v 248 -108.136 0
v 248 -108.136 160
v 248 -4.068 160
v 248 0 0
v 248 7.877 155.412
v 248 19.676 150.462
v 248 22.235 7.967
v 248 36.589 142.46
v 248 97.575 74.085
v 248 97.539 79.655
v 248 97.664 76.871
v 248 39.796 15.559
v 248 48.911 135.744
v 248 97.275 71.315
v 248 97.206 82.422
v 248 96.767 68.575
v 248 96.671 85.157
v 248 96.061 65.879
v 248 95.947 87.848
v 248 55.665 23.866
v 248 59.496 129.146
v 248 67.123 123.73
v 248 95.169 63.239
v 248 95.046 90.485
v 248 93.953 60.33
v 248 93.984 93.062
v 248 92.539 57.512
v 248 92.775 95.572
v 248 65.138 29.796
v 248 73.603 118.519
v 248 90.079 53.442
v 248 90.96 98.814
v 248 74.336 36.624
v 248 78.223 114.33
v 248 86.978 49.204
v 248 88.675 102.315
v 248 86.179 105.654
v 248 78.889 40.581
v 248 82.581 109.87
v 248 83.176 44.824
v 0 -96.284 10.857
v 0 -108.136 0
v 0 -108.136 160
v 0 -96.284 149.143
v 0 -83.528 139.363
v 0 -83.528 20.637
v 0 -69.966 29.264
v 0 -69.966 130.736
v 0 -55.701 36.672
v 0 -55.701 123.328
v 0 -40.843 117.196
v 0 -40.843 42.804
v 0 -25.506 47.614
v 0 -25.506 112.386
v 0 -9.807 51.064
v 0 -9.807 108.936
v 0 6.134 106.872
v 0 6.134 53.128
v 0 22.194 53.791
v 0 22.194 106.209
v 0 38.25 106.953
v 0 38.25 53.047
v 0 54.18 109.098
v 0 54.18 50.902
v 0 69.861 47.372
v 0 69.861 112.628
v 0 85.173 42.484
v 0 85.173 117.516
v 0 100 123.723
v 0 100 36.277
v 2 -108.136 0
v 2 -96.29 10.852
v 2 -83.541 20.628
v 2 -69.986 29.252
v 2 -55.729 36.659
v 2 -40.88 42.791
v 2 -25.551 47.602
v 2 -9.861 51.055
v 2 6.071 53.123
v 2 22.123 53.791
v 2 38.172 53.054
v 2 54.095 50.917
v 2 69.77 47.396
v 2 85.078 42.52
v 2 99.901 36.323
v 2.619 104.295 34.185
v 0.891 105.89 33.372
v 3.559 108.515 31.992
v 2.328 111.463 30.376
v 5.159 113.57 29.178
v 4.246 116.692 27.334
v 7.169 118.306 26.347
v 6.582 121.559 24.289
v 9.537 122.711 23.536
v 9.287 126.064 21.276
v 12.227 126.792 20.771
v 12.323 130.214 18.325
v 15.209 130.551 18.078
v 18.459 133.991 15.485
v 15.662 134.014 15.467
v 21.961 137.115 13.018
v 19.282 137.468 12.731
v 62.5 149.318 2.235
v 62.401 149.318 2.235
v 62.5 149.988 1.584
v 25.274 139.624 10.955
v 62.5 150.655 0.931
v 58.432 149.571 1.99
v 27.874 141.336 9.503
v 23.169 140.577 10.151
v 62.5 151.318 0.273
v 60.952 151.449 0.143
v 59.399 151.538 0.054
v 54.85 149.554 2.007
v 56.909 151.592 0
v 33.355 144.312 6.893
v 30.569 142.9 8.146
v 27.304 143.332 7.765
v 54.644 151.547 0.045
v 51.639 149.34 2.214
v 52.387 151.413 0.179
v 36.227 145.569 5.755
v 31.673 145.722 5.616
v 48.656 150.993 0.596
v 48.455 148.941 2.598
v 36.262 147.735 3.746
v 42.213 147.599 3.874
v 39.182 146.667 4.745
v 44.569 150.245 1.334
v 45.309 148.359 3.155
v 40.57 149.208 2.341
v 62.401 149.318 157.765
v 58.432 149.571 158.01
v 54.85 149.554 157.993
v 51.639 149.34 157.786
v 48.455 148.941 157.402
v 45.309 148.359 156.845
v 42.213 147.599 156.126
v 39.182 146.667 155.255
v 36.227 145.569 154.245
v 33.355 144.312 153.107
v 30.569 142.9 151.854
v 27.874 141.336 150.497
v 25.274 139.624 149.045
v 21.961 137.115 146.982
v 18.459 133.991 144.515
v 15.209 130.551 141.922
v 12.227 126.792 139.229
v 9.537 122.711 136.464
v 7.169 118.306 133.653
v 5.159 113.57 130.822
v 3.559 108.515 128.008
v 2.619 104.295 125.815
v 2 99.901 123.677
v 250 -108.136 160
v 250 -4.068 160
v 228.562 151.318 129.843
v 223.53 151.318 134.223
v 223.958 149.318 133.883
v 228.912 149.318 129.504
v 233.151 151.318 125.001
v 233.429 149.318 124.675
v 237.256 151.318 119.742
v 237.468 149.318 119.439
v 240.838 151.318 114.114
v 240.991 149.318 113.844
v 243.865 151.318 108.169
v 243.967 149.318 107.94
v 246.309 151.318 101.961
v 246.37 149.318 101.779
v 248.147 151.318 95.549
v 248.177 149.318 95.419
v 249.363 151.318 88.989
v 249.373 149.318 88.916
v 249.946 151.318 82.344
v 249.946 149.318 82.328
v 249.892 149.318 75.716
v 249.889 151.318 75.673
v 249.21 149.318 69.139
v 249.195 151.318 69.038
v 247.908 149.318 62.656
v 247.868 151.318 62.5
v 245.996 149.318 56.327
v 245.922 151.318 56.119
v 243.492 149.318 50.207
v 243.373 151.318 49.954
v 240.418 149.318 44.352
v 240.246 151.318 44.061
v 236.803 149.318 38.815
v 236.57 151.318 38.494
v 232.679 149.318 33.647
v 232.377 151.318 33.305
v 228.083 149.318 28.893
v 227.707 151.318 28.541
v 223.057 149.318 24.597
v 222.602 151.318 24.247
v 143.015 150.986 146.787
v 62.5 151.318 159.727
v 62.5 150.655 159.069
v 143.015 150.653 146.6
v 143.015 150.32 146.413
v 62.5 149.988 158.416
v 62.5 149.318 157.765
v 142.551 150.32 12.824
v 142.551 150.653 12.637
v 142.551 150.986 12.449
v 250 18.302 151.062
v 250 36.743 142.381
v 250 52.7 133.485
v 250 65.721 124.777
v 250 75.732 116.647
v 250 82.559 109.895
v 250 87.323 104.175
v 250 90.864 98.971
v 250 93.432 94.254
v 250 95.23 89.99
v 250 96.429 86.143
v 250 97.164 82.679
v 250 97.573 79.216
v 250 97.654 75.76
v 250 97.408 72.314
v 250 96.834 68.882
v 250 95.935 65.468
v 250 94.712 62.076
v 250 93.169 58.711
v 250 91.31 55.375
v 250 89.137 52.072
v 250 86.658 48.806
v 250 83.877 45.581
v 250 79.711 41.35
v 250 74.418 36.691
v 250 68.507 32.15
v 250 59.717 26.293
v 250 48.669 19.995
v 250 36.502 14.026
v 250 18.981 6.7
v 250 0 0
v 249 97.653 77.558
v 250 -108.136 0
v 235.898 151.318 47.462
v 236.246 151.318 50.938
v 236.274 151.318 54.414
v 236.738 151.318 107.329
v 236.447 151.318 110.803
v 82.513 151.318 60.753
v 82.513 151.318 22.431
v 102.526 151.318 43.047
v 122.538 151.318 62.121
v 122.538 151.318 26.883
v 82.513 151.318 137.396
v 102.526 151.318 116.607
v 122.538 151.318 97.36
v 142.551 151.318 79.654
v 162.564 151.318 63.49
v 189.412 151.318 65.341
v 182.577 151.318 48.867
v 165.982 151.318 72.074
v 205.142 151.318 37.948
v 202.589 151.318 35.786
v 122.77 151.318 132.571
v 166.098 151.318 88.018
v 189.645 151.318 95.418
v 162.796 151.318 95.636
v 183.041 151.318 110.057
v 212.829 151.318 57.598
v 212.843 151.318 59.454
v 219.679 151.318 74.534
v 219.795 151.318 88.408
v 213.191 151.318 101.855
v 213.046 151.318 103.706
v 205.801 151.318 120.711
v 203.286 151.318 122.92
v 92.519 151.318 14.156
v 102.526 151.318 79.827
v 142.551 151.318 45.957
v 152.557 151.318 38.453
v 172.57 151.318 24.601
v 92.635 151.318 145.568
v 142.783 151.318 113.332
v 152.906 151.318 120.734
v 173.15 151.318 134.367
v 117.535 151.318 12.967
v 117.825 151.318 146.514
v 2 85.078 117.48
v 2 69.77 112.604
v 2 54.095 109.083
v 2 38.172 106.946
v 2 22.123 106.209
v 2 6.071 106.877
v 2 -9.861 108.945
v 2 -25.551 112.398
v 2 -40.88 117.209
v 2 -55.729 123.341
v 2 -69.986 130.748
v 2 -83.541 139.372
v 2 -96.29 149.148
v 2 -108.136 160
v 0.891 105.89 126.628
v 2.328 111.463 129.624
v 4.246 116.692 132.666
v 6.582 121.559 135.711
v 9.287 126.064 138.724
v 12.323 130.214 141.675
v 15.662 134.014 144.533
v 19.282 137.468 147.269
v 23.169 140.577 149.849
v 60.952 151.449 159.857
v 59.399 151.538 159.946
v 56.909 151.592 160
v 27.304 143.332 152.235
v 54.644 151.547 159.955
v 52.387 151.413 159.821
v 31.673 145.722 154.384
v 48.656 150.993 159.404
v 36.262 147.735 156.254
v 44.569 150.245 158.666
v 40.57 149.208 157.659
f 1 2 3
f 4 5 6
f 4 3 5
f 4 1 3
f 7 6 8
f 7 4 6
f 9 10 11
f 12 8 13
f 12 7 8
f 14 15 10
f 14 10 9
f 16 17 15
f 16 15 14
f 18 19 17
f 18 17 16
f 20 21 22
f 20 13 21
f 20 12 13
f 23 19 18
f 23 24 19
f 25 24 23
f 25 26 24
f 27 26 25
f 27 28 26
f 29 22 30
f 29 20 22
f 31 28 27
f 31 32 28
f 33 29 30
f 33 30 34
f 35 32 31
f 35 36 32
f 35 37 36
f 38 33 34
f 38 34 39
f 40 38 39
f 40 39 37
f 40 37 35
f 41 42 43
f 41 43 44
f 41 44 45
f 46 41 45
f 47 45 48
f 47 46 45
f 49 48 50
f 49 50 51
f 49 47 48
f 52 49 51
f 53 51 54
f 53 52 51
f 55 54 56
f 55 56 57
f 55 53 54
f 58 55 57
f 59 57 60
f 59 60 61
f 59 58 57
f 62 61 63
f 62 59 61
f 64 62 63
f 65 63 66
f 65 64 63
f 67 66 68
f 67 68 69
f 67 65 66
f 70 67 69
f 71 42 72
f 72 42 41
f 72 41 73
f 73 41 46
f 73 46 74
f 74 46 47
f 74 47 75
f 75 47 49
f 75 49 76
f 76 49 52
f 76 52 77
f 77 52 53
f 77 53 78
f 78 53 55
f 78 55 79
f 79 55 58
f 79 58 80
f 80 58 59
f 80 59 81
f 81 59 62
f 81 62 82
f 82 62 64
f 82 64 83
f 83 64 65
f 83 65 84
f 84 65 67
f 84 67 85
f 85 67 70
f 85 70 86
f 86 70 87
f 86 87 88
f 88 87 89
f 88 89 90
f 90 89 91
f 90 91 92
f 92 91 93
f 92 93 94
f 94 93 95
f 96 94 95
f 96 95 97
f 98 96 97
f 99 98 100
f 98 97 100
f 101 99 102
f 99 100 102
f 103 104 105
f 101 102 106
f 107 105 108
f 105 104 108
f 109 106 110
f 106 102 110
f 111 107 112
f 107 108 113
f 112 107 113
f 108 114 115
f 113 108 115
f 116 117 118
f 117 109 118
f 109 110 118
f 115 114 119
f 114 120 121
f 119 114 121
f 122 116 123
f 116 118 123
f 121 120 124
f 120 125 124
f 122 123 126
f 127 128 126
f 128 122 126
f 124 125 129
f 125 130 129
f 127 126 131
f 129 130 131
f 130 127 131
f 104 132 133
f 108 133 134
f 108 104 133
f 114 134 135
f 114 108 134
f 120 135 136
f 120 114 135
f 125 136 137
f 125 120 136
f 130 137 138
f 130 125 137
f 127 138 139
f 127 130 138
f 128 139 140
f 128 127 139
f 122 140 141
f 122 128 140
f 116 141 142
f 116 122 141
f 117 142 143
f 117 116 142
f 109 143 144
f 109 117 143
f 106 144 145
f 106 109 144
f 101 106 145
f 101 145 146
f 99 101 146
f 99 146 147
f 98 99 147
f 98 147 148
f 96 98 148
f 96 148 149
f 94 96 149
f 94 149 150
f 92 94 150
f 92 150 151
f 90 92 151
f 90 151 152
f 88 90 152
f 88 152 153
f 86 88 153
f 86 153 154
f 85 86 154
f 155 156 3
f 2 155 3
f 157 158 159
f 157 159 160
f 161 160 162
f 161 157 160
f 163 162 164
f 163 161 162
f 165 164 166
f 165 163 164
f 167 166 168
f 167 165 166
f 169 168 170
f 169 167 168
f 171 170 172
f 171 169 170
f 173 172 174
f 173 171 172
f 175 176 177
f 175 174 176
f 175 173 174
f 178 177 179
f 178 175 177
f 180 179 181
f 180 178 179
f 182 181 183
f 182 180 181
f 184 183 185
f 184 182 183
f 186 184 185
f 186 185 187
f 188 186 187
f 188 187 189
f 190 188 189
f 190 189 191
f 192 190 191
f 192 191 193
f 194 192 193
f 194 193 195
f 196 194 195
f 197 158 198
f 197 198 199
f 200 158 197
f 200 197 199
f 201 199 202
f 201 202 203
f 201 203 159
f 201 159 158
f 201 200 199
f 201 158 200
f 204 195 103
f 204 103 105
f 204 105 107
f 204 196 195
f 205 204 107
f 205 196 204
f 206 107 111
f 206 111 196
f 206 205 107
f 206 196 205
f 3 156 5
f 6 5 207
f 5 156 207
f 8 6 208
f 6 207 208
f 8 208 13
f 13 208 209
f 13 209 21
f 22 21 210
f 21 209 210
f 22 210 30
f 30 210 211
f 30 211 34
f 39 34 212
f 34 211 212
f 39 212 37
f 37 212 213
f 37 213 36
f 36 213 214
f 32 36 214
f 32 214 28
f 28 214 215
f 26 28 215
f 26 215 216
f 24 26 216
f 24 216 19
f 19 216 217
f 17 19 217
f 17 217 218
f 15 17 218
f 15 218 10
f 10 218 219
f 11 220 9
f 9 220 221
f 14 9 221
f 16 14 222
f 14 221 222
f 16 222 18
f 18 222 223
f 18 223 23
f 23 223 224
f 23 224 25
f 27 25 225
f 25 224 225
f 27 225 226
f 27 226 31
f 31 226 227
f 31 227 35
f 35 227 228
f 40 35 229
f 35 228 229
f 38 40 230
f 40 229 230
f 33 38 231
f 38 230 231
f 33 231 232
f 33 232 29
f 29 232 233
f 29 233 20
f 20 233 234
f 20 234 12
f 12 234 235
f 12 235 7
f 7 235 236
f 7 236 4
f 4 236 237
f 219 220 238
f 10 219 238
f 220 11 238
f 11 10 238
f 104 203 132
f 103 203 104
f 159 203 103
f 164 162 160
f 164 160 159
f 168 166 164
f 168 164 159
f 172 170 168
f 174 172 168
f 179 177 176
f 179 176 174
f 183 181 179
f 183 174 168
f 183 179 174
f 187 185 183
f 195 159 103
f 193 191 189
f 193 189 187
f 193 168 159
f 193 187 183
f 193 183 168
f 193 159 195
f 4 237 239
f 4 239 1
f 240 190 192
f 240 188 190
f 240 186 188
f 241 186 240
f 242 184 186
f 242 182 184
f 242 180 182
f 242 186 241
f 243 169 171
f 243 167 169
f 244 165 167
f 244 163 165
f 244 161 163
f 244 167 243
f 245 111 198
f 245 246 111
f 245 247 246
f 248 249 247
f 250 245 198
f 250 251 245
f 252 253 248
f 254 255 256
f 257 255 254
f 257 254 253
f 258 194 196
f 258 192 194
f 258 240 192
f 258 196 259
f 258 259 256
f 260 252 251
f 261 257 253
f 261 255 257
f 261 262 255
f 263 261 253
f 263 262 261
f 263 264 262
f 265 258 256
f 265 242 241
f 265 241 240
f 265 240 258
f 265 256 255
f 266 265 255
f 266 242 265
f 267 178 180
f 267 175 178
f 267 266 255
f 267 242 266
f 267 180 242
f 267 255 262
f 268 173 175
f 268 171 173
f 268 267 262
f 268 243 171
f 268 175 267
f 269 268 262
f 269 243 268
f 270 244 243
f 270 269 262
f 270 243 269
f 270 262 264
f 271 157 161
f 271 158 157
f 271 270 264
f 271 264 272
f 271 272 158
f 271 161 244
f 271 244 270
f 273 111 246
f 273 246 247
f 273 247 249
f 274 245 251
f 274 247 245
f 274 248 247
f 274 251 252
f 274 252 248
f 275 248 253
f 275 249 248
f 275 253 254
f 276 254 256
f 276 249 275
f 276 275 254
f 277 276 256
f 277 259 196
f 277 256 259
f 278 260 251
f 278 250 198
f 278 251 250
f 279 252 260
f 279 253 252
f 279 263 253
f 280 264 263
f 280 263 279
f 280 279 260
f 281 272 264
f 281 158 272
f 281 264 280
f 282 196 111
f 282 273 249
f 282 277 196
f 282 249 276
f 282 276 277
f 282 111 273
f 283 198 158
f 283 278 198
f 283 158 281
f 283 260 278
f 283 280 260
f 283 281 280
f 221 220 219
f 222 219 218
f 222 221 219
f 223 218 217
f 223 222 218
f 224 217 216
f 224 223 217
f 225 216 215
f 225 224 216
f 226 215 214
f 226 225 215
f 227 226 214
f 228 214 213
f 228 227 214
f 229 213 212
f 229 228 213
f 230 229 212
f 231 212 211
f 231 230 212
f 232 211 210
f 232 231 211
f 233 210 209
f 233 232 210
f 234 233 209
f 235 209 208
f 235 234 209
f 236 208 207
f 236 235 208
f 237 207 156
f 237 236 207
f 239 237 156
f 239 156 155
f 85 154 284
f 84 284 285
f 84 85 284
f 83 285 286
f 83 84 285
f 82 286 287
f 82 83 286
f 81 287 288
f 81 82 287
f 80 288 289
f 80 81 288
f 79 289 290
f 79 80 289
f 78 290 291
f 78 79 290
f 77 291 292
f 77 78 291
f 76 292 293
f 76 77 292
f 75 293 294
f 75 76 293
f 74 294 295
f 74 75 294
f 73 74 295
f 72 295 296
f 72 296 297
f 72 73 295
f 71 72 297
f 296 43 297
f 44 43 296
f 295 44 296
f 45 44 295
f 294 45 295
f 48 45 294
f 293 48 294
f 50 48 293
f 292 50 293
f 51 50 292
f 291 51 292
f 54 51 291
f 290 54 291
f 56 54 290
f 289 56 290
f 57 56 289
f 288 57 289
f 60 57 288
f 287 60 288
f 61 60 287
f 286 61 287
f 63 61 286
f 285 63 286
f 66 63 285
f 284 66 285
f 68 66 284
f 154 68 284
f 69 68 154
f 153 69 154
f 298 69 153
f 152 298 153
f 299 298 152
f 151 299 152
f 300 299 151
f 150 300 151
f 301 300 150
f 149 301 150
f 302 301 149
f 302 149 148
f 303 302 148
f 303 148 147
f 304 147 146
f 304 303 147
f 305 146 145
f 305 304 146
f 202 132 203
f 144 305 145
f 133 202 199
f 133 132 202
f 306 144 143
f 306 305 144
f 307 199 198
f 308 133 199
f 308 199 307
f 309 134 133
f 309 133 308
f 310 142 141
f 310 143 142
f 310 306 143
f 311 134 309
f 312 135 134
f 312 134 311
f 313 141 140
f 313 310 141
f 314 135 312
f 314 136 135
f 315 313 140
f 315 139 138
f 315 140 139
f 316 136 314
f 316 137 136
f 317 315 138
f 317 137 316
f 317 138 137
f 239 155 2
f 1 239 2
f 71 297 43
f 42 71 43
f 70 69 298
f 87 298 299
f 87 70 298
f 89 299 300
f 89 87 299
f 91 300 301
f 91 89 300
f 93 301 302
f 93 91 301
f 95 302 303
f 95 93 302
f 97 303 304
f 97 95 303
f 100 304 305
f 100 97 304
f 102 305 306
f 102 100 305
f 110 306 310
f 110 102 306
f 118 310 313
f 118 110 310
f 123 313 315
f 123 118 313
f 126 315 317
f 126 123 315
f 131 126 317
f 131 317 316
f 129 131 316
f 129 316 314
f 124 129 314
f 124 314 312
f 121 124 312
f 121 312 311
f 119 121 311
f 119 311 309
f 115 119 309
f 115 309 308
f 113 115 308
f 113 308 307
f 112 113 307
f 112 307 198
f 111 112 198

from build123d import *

# Parameters (mm, degrees)
EXTRUDE_THIN3_DEPTH = 160
SKETCH2_W           = 187.5
SKETCH2_H           = 160
CUT_EXTRUDE1_DEPTH  = 50
SKETCH3_W           = 41.338568599
SKETCH3_H           = 174.810809694
CUT_EXTRUDE2_DEPTH  = 50
CUT_EXTRUDE3_DEPTH  = 50
CUT_EXTRUDE4_DEPTH  = 76
CUT_EXTRUDE5_DEPTH  = 76
CUT_EXTRUDE6_DEPTH  = 76
SKETCH15_W          = 101.681727428
SKETCH15_H          = 2
CUT_EXTRUDE7_DEPTH  = 28


with BuildPart() as part:
    # Sketch1 → Extrude-Thin3 (new body)
    with BuildSketch(Plane.XY):
        with BuildLine():
            Line((0, -108.136343176), (0, -58.136343176))
            Line((0, -58.136343176), (0, 0))
            Line((0, 0), (0, 100))
            ThreePointArc((0, 100), (20.62169433, 138.603173517), (62.5, 151.317999385))
            Line((62.5, 151.317999385), (187.5, 151.317999385))
            ThreePointArc((187.5, 151.317999385), (229.37830567, 138.603173517), (250, 100))
            Line((250, 100), (250, 0))
            Line((250, 0), (250, -58.136343176))
            Line((250, -58.136343176), (250, -108.136343176))
            Line((250, -108.136343176), (248, -108.136343176))
            Line((248, -108.136343176), (248, -58.136343176))
            Line((248, -58.136343176), (248, 0))
            Line((248, 0), (248, 99.901116926))
            ThreePointArc((248, 99.901116926), (228.034012999, 137.119039063), (187.598883074, 149.317999385))
            Line((187.598883074, 149.317999385), (62.401116926, 149.317999385))
            ThreePointArc((62.401116926, 149.317999385), (21.965987001, 137.119039063), (2, 99.901116926))
            Line((2, 99.901116926), (2, 0))
            Line((2, 0), (2, -58.136343176))
            Line((2, -58.136343176), (2, -108.136343176))
            Line((2, -108.136343176), (0, -108.136343176))
        make_face()
    extrude(amount=EXTRUDE_THIN3_DEPTH)

    # Sketch2 → Cut-Extrude1 (cut)
    with BuildSketch(Plane(origin=(0, 151.317999385, 0), x_dir=(1, 0, 0), z_dir=(0, 1, 0))):
        with Locations((156.25, -80)):
            Rectangle(SKETCH2_W, SKETCH2_H)
    extrude(amount=-CUT_EXTRUDE1_DEPTH, mode=Mode.SUBTRACT)


with BuildPart() as cut_extrude1_piece_1:
    # of the separate pieces the step leaves, piece 1, a body of its own (cut_extrude1_pieces)
    add(part.part.solids().sort_by_distance((0, -108.136343176, 0))[0])

    # Sketch4 → Cut-Extrude3 (cut)
    with BuildSketch(Plane.ZY):
        with BuildLine():
            Line((0, 100), (0, -108.136343176))
            ThreePointArc((0, -108.136343176), (43.106448083, -4.068171588), (0, 100))
        make_face()
        with BuildLine():
            Line((160, 100), (160, -108.136343176))
            ThreePointArc((160, -108.136343176), (116.893551917, -4.068171588), (160, 100))
        make_face()
    extrude(amount=-CUT_EXTRUDE3_DEPTH, mode=Mode.SUBTRACT)

    # Sketch10 → Cut-Extrude4 (cut)
    with BuildSketch(Plane.ZY):
        with BuildLine():
            Line((160, 151.591982567), (160, -108.136343176))
            ThreePointArc((160, -108.136343176), (106.208502472, 21.727819696), (160, 151.591982567))
        make_face()
    extrude(amount=-CUT_EXTRUDE4_DEPTH, mode=Mode.SUBTRACT)

    # Sketch11 → Cut-Extrude5 (cut)
    with BuildSketch(Plane.ZY):
        with BuildLine():
            Line((0, 151.591982567), (0, -108.136343176))
            ThreePointArc((0, -108.136343176), (53.791497528, 21.727819696), (0, 151.591982567))
        make_face()
    extrude(amount=-CUT_EXTRUDE5_DEPTH, mode=Mode.SUBTRACT)

    # Sketch15 → section 1 of loft2
    with BuildSketch(Plane(origin=(250, 0, 0), x_dir=(0, 0, -1), z_dir=(1, 0, 0)), mode=Mode.PRIVATE) as loft2_s1:
        with Locations((-79.189925073, 150.317999385)):
            Rectangle(SKETCH15_W, SKETCH15_H)
    # loft from a face of the part (loft2)
    loft([cut_extrude1_piece_1.faces().sort_by_distance((62.5, 150.322150962, 80))[0], loft2_s1.sketch])

    # Sketch16 → Cut-Extrude7 (cut)
    with BuildSketch(Plane(origin=(0, 151.317999385, 0), x_dir=(1, 0, 0), z_dir=(0, 1, 0))):
        with BuildLine():
            Line((156.25, -14.311233858), (176.822030282, 28.432325683))
            Line((176.822030282, 28.432325683), (259.553291399, -32.590672084))
            Line((259.553291399, -32.590672084), (263.183560197, -157.384709674))
            Line((263.183560197, -157.384709674), (159.971927258, -160.387144549))
            Line((159.971927258, -160.387144549), (156.25, -144.878691215))
            ThreePointArc((156.25, -144.878691215), (250, -79.594962536), (156.25, -14.311233858))
        make_face()
    extrude(amount=-CUT_EXTRUDE7_DEPTH, mode=Mode.SUBTRACT)


with BuildPart() as cut_extrude1_piece_2:
    # of the separate pieces the step leaves, piece 2, a body of its own (cut_extrude1_pieces)
    add(part.part.solids().sort_by_distance((249.855066879, 101.317999385, 160))[0])

    # Sketch12 → Cut-Extrude6 (cut)
    with BuildSketch(Plane(origin=(250, 0, 0), x_dir=(0, 0, -1), z_dir=(1, 0, 0))):
        with BuildLine():
            Line((-160, -4.068171588), (-160, 100))
            Line((-160, 100), (-160, 129.751357578))
            Line((-160, 129.751357578), (0, 129.751357578))
            Line((0, 129.751357578), (0, 0))
            add(Edge.make_bspline(
                [(-160, -4.068171588), (-74.35058709, 228.559103464), (0, 0)],
                knots=[0, 0, 0, 1, 1, 1], degree=2, weights=[1, 0.761512218, 1]))
        make_face()
    extrude(amount=-CUT_EXTRUDE6_DEPTH, mode=Mode.SUBTRACT)


with BuildPart() as cut_extrude1_piece_3:
    # of the separate pieces the step leaves, piece 3, a body of its own (cut_extrude1_pieces)
    add(part.part.solids().sort_by_distance((198.682000615, 151.317999385, 160))[0])

    # Sketch3 → Cut-Extrude2 (cut)
    with BuildSketch(Plane.XZ.offset(-151.317999385)):
        with Locations((192.9519608, 76.21738588)):
            Rectangle(SKETCH3_W, SKETCH3_H)
    extrude(amount=-CUT_EXTRUDE2_DEPTH, mode=Mode.SUBTRACT)


solid = Compound([cut_extrude1_piece_1.part, cut_extrude1_piece_2.part])
